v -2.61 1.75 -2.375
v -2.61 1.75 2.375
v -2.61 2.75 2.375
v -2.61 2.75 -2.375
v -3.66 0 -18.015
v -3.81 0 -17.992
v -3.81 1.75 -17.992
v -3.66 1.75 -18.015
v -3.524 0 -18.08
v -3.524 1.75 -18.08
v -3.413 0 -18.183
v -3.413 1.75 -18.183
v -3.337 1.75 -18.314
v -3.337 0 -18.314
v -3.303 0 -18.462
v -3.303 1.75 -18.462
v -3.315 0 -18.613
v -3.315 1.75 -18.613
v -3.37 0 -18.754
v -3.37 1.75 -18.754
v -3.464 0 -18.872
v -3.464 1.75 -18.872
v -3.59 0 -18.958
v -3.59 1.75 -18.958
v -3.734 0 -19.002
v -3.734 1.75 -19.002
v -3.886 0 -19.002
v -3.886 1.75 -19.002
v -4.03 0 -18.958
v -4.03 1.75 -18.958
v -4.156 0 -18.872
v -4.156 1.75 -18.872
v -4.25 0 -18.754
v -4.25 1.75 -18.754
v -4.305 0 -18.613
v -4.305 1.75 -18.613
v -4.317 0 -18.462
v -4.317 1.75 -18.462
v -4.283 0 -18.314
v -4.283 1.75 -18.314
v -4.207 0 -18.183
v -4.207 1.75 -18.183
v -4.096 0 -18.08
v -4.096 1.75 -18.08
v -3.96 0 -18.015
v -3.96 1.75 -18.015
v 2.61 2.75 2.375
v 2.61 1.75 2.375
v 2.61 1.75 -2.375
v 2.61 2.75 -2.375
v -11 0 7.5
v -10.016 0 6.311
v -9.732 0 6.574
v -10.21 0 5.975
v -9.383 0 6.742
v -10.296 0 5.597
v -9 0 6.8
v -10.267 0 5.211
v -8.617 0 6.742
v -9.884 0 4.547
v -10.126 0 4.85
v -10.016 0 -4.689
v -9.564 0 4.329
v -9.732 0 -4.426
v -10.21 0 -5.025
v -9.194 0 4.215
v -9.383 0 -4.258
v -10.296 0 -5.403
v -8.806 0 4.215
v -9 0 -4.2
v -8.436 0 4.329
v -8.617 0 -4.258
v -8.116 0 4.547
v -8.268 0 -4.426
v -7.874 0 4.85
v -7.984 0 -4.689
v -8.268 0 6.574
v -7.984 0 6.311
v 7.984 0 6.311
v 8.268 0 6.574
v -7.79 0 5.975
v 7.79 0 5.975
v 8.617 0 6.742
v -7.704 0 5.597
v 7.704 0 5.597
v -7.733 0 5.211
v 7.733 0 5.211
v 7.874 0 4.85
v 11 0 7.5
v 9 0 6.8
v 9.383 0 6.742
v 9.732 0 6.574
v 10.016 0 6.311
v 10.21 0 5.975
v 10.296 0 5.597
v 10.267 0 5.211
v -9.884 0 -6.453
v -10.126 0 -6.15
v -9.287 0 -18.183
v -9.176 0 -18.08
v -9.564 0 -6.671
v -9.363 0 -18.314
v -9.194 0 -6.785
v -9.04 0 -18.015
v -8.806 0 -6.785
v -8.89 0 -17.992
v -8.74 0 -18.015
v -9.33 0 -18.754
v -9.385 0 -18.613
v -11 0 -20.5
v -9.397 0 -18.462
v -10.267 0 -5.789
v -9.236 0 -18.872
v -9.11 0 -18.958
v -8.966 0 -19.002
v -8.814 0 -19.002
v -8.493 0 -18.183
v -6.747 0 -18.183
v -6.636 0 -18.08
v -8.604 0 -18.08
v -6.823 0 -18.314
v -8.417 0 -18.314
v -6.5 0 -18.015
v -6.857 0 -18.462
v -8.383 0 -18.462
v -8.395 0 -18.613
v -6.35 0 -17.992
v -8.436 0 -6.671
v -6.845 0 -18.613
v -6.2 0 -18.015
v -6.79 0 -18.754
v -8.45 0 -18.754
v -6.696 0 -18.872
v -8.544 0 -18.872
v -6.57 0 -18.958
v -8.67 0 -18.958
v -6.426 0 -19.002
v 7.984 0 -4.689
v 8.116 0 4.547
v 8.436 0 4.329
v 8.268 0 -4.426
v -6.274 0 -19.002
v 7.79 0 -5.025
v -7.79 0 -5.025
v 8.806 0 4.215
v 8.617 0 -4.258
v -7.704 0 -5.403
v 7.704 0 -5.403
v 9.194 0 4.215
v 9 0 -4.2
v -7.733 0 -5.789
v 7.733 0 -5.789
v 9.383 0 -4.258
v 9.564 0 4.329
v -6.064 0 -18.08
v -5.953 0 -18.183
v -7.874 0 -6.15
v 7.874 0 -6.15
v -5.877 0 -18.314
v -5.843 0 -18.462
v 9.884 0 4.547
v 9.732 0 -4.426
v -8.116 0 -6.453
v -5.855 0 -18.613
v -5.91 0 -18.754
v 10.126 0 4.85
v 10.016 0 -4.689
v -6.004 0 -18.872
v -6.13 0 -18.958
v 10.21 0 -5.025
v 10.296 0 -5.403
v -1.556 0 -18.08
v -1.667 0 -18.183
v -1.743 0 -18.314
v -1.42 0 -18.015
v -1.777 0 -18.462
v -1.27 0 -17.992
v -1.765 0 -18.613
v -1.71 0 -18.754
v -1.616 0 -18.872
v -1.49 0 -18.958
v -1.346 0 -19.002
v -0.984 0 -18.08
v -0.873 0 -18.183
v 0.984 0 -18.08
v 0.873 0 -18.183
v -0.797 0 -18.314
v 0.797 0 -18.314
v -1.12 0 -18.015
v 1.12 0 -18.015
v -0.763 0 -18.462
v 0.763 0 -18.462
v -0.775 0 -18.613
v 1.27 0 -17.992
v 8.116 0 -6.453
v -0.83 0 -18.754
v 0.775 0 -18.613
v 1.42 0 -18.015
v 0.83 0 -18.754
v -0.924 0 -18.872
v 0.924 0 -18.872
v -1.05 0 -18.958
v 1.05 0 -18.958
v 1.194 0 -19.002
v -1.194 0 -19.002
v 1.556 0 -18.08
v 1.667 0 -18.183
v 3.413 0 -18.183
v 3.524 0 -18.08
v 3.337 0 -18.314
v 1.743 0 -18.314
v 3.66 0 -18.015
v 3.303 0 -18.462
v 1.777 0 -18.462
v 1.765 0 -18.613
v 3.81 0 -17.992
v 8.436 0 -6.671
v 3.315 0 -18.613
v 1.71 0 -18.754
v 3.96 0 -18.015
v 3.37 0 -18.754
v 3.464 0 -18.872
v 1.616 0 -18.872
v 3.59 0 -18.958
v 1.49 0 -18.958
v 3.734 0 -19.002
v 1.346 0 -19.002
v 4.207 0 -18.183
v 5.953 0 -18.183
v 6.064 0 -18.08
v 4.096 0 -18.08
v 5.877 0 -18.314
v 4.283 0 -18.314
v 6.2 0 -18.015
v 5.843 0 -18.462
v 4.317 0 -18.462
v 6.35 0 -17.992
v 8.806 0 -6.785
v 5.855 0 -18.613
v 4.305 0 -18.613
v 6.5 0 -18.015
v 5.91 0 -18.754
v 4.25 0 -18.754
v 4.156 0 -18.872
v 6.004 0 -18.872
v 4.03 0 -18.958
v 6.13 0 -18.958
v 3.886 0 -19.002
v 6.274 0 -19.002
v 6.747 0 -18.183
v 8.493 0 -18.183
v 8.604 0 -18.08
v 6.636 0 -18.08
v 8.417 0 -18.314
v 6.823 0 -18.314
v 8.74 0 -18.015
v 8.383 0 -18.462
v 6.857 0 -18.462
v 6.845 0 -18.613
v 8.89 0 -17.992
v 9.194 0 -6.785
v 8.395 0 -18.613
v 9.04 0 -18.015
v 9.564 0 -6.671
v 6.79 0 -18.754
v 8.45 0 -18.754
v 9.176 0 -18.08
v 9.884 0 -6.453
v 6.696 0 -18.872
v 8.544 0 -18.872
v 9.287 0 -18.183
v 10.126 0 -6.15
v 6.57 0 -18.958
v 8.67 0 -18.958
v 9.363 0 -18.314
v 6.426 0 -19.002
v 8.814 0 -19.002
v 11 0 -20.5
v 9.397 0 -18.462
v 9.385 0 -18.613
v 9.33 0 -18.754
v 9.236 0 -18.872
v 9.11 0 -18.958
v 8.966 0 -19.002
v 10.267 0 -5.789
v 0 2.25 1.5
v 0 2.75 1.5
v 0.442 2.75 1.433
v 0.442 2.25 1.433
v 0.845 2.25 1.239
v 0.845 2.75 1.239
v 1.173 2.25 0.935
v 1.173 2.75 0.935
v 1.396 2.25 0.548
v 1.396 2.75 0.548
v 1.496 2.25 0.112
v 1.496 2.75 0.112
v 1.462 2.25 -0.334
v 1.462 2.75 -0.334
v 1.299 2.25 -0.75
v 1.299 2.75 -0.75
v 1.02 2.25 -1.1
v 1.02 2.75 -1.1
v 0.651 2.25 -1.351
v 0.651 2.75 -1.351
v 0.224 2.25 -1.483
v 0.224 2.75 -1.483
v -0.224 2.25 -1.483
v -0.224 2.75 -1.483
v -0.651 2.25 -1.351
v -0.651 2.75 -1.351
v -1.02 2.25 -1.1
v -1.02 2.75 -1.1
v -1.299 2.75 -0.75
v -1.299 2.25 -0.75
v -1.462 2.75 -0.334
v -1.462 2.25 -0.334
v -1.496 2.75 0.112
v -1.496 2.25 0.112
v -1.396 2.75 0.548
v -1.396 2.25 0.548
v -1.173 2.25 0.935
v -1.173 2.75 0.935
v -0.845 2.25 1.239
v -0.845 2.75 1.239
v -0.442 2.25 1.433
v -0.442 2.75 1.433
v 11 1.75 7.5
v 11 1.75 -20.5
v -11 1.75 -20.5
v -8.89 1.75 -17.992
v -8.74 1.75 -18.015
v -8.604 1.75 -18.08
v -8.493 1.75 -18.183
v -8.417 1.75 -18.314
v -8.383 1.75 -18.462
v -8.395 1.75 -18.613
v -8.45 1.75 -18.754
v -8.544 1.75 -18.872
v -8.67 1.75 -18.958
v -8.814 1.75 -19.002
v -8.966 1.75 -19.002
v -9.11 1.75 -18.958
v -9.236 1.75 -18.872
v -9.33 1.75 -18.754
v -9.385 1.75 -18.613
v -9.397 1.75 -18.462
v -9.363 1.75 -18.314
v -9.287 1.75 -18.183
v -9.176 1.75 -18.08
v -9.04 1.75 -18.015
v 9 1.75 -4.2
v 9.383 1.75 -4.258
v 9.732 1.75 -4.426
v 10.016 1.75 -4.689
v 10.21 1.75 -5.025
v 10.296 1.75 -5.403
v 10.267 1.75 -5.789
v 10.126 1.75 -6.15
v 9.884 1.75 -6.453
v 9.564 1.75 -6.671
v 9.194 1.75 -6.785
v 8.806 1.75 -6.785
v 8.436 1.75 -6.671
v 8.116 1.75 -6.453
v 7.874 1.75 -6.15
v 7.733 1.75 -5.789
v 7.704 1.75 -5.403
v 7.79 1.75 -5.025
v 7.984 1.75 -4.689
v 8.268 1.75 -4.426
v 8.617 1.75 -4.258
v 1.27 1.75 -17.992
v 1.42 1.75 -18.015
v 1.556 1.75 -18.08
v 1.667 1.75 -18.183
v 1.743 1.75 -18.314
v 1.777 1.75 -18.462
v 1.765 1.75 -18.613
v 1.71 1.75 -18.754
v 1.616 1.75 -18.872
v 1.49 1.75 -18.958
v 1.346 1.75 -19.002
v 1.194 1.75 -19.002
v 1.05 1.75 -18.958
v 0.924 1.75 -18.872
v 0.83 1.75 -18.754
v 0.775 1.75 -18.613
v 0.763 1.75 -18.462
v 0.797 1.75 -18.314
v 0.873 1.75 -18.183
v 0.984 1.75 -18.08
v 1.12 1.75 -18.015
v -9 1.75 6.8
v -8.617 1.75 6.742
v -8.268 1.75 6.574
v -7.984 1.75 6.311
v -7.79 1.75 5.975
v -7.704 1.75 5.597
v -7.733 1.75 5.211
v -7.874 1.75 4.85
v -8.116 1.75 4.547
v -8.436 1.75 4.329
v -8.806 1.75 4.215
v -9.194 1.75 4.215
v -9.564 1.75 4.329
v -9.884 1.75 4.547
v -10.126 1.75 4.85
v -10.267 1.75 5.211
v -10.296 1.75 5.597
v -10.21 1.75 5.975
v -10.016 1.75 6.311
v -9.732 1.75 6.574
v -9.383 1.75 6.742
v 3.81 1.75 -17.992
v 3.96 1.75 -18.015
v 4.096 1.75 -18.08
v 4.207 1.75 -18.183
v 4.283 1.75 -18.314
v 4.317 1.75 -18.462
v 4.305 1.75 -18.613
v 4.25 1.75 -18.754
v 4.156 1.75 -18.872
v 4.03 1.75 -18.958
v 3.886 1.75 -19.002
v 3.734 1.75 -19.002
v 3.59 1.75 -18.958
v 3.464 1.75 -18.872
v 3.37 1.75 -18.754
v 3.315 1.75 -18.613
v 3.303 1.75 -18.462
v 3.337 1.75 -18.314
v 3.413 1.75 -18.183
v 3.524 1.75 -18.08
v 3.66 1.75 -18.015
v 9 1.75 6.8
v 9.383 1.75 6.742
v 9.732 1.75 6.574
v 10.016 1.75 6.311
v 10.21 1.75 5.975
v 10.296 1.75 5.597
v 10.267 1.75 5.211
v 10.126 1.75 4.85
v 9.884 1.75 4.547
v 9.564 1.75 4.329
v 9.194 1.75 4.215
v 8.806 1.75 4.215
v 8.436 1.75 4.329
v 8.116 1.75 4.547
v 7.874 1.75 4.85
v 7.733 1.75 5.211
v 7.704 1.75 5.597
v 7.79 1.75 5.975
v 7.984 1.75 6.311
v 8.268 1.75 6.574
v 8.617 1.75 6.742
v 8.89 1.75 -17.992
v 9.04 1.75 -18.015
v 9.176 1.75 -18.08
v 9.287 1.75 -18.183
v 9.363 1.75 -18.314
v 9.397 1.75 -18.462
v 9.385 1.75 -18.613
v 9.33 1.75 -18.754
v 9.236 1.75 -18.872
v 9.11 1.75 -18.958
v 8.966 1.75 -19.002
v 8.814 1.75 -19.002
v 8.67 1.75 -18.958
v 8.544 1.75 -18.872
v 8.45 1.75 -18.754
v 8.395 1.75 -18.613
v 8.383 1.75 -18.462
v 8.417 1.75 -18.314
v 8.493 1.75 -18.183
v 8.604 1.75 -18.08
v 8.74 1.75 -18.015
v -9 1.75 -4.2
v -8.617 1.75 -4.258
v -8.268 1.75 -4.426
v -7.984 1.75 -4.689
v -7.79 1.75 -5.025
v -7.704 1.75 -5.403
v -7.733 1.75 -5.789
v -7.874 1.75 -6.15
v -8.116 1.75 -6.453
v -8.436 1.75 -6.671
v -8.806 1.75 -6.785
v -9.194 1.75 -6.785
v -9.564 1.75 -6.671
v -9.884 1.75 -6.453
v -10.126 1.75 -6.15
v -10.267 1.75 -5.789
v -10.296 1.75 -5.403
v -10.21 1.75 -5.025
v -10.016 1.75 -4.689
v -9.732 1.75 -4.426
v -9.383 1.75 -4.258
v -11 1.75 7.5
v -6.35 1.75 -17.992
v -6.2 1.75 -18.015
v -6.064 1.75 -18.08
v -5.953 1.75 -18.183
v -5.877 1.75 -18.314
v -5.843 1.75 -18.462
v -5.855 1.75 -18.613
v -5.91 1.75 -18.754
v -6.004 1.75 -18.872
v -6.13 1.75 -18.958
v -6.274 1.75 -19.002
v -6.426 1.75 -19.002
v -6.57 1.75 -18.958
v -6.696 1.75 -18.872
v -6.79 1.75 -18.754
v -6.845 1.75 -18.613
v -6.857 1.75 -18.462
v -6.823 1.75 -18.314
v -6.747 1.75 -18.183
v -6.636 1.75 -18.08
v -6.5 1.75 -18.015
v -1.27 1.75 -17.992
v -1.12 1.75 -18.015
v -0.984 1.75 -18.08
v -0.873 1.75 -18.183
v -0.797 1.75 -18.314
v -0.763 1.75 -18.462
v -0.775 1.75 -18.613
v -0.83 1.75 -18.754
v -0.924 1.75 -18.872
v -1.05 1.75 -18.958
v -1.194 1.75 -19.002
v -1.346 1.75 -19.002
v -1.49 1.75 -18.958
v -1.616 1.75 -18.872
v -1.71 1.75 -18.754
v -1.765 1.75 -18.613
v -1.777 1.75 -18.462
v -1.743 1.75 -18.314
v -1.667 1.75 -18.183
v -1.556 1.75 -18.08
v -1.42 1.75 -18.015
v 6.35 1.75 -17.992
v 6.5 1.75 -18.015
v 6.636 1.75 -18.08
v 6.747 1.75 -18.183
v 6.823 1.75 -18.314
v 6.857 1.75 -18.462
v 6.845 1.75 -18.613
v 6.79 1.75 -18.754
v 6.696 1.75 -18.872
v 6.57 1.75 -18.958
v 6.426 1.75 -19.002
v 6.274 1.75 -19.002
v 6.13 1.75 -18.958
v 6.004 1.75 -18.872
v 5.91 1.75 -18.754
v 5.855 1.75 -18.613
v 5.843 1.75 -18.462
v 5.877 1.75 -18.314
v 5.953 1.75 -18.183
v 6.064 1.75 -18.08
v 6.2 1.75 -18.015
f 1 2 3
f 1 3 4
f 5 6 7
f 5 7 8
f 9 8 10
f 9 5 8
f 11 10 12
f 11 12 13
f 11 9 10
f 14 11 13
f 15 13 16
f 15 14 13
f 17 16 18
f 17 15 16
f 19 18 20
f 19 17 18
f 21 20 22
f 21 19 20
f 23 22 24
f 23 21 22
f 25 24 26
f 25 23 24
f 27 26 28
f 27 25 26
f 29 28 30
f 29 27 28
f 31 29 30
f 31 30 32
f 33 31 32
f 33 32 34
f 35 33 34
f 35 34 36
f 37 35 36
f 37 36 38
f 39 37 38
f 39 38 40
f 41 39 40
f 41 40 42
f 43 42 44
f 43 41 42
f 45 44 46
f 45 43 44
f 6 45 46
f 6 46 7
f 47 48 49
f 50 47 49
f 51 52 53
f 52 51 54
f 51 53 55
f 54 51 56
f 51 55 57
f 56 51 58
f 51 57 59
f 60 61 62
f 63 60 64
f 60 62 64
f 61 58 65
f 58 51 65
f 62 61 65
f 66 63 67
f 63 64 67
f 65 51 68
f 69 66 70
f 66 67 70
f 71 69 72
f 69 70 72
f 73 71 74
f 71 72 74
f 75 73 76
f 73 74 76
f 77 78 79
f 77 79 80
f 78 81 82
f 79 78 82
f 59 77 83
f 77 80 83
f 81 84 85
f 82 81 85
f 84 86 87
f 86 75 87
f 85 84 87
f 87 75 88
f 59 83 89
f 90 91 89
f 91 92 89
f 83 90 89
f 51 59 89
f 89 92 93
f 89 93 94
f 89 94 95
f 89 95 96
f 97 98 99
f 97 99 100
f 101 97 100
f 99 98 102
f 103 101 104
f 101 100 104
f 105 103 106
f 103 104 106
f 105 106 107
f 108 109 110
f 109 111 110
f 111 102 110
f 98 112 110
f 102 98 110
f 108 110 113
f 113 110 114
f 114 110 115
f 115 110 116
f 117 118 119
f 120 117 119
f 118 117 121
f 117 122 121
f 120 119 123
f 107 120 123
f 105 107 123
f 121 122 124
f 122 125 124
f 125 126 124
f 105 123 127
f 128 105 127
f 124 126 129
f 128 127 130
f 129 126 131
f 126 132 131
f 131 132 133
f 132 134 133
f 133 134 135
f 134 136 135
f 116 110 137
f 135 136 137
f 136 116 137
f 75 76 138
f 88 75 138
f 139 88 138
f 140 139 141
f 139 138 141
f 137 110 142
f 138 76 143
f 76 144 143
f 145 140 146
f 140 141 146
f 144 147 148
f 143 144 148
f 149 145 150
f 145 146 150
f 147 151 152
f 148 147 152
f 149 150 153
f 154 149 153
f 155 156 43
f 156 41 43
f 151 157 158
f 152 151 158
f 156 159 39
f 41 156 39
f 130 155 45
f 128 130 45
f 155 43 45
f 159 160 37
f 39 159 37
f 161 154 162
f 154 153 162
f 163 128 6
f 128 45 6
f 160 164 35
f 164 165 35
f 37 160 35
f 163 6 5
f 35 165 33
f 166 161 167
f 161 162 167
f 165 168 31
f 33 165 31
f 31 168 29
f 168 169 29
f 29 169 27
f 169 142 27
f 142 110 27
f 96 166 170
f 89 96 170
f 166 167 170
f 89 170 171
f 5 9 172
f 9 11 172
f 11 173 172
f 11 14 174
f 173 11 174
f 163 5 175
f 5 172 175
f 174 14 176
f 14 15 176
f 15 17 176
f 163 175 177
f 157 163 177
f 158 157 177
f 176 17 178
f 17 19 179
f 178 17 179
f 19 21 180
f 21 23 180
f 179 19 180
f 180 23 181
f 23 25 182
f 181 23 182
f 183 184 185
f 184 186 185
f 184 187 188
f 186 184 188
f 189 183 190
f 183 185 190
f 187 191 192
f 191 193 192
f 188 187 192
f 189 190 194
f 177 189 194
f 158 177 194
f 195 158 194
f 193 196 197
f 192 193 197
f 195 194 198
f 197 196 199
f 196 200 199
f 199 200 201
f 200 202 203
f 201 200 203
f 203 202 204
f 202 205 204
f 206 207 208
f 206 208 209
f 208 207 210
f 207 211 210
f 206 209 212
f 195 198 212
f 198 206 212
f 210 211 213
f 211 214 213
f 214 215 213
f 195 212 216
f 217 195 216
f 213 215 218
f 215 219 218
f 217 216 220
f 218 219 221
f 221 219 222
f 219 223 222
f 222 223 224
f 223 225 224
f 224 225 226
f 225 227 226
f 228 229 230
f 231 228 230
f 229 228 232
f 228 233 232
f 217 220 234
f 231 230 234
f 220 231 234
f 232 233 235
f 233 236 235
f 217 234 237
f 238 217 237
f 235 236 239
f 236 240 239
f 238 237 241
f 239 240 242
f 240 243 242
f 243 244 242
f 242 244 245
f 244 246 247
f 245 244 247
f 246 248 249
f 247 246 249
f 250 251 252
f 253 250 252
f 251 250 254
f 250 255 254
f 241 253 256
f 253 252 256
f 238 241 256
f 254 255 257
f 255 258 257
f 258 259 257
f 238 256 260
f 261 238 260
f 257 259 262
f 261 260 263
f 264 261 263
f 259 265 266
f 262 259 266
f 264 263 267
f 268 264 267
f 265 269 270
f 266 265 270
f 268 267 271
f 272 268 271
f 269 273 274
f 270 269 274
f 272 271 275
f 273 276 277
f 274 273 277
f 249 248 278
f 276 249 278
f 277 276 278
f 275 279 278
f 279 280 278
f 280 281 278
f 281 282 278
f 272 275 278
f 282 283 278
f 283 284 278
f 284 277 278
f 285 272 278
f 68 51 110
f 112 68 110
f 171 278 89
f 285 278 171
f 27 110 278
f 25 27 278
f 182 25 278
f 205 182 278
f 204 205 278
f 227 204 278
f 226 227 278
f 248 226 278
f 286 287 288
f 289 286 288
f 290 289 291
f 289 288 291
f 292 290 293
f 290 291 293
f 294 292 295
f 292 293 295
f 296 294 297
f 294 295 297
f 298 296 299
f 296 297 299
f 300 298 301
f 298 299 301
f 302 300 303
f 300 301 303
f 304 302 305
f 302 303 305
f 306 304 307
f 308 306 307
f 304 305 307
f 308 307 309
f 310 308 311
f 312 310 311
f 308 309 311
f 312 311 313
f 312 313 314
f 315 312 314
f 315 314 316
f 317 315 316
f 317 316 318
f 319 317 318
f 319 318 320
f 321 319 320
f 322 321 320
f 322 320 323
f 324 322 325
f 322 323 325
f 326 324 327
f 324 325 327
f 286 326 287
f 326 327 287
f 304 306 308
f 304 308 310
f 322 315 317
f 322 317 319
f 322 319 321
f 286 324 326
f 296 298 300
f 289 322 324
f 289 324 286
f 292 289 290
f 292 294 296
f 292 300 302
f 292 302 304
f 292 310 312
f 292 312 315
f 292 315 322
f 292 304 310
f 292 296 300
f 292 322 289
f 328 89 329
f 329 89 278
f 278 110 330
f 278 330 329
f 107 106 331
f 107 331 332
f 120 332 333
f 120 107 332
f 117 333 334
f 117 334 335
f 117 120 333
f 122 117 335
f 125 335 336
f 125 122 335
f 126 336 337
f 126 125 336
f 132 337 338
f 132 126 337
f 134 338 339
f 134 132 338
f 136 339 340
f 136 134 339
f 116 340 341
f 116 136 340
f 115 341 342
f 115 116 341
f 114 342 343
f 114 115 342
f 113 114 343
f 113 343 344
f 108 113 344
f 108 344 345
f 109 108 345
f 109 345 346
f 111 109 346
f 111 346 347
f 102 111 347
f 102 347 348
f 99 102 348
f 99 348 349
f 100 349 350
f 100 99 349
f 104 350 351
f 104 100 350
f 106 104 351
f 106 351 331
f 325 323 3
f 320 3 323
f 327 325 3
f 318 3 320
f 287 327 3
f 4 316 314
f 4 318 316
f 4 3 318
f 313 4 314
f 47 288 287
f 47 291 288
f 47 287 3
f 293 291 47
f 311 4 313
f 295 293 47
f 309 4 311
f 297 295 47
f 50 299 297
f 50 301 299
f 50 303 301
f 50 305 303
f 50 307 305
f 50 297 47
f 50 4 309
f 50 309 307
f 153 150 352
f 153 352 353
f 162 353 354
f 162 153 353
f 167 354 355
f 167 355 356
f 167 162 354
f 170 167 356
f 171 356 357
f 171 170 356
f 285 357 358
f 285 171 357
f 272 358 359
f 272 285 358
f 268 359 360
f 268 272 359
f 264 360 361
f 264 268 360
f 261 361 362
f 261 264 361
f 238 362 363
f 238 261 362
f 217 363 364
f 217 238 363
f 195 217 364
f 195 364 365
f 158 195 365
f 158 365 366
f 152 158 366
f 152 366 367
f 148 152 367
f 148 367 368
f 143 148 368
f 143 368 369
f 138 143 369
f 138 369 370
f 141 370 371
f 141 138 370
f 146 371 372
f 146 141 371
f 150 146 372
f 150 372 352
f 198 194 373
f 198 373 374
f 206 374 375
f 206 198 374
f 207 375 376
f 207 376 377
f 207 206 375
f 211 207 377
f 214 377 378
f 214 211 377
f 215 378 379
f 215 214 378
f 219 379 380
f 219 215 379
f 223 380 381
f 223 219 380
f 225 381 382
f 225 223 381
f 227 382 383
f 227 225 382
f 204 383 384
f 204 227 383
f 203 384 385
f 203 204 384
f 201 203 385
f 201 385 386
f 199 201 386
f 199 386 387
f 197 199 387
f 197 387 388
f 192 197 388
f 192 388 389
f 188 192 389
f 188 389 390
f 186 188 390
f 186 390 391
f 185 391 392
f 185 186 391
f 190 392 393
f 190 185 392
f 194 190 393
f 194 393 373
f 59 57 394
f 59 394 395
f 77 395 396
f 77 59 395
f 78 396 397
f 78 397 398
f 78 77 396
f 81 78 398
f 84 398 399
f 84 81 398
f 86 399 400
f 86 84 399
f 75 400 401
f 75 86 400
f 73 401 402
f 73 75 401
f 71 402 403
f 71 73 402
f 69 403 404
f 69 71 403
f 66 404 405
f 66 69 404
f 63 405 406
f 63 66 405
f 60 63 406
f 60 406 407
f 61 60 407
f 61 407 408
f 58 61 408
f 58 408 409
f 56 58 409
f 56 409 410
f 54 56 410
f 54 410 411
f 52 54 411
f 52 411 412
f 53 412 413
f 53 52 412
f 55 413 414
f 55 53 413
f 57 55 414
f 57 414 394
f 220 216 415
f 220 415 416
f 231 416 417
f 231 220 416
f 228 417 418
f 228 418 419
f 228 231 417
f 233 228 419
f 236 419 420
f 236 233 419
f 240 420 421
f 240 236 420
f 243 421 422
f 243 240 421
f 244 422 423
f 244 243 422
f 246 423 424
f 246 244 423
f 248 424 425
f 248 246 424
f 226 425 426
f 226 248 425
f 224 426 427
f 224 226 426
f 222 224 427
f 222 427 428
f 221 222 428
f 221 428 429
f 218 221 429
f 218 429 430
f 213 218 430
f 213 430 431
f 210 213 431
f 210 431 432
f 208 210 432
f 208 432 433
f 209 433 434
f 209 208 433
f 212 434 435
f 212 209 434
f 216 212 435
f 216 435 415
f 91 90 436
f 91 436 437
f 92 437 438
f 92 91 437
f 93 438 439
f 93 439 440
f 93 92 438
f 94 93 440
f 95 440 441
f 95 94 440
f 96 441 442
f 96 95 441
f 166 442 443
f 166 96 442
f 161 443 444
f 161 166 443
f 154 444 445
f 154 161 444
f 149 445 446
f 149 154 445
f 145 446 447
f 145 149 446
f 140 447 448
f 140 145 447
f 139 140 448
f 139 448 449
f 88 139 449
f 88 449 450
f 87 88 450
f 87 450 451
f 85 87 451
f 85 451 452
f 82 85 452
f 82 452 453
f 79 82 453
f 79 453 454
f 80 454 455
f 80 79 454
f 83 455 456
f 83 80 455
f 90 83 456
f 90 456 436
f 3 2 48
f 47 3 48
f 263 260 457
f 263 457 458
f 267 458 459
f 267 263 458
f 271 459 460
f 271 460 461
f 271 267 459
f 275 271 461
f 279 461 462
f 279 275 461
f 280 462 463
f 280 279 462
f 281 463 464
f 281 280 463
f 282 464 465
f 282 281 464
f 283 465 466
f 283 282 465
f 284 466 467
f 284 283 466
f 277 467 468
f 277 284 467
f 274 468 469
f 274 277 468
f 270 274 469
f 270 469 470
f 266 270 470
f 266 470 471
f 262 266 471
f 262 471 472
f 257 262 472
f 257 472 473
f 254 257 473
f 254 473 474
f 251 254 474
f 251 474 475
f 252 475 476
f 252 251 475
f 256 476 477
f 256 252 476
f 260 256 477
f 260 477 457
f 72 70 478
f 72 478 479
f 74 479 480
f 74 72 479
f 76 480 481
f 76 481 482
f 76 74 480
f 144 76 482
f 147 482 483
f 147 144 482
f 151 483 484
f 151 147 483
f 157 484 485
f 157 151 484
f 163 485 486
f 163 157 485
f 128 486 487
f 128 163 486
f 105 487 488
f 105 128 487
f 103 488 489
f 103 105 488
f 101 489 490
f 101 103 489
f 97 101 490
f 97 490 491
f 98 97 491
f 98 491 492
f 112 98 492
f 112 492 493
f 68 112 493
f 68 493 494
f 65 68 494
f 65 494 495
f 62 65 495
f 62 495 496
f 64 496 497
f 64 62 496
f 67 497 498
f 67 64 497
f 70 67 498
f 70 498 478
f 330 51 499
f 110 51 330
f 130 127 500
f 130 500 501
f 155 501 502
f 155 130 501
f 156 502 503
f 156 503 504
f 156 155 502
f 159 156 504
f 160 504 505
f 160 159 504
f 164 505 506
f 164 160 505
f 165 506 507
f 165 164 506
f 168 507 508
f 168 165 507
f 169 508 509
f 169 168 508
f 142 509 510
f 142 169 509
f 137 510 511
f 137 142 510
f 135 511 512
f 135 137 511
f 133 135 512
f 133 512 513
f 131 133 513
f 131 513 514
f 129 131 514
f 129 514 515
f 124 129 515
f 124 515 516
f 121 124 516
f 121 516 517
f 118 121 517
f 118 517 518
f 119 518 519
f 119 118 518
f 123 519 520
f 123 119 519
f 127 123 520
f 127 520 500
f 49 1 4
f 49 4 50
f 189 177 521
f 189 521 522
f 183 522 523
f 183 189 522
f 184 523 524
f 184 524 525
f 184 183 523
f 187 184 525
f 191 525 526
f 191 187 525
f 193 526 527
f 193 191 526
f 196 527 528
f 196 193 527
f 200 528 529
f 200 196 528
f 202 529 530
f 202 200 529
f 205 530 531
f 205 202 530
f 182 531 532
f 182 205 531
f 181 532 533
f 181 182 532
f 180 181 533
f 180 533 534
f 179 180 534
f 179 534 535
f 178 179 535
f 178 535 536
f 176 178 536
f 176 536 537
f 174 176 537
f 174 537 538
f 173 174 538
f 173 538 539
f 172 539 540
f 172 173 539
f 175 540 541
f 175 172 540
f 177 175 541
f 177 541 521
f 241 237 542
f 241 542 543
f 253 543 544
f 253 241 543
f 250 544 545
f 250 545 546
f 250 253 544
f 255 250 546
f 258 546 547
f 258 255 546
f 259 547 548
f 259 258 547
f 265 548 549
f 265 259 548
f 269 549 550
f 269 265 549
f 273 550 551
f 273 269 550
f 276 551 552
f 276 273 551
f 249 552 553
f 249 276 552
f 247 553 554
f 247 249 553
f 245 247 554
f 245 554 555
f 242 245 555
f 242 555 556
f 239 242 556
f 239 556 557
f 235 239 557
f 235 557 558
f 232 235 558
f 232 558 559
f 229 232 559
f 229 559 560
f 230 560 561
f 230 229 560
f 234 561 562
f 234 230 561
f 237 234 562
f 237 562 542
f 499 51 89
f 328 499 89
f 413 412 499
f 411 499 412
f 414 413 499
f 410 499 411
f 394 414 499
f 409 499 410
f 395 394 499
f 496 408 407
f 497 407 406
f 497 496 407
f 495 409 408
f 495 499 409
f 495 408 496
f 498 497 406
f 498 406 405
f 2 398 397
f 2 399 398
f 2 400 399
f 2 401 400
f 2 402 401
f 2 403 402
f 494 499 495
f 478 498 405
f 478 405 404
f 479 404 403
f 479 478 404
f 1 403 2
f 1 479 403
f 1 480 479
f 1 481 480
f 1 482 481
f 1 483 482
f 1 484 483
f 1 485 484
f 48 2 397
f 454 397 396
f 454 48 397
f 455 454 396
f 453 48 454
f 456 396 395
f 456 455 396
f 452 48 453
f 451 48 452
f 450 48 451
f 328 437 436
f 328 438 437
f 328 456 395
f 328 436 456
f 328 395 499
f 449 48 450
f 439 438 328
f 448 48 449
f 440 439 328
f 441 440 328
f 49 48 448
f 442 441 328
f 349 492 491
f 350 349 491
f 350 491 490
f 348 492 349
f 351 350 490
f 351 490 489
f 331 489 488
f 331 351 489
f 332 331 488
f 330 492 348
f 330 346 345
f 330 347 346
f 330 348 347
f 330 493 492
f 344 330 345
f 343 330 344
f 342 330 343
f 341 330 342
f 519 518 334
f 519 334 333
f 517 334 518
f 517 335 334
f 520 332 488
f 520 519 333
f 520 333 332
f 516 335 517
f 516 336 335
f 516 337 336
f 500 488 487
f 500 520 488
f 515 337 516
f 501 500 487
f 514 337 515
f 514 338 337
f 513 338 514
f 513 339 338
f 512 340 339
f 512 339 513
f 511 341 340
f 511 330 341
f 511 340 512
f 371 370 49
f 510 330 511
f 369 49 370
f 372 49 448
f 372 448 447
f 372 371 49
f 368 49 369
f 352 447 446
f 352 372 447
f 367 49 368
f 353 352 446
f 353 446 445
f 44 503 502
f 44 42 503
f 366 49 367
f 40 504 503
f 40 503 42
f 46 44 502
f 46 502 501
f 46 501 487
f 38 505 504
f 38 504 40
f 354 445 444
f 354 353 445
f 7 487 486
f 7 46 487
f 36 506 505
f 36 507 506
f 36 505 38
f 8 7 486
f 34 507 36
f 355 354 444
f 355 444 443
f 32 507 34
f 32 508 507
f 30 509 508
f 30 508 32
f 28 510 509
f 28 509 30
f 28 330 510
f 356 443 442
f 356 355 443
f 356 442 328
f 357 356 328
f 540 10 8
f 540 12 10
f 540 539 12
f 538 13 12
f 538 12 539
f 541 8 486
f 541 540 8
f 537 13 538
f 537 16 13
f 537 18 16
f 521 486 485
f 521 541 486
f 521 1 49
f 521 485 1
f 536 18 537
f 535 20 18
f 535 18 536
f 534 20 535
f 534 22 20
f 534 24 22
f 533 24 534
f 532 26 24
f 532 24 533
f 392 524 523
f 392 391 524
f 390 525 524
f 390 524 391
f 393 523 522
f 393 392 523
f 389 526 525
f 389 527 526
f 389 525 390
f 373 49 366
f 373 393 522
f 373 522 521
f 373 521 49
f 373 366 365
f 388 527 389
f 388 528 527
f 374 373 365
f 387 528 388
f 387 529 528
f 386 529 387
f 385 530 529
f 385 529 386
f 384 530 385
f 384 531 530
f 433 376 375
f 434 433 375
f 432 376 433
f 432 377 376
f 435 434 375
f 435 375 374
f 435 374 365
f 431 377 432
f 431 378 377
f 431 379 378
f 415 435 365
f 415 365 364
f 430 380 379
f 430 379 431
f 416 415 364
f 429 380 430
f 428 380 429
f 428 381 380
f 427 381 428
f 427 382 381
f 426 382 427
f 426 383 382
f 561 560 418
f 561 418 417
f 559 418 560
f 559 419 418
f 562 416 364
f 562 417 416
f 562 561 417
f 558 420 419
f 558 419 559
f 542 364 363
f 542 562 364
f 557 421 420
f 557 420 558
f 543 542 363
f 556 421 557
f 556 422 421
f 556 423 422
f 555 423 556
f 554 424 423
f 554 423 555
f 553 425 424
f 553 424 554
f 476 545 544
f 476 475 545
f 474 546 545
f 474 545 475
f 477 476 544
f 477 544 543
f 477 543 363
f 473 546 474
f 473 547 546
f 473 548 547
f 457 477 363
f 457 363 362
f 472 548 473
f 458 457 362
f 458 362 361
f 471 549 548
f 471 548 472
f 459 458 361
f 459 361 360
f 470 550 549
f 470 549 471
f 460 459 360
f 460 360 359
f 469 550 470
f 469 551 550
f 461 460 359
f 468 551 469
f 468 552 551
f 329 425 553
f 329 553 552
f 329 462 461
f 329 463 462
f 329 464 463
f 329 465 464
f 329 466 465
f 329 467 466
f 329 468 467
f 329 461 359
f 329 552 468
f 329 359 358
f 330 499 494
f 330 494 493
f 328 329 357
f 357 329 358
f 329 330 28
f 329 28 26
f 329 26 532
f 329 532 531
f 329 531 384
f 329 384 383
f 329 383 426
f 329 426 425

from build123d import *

# Parameters (mm, degrees)
SKETCH1_W           = 22
SKETCH1_H           = 28
SKETCH1_R           = 1.3
SKETCH1_R_2         = 0.508
BOSS_EXTRUDE1_DEPTH = 1.75
SKETCH2_W           = 5.22
SKETCH2_H           = 4.75
BOSS_EXTRUDE2_DEPTH = 1
SKETCH3_R           = 1.5
CUT_EXTRUDE1_DEPTH  = 0.5


with BuildPart() as part:
    # Sketch1 → Boss-Extrude1 (new body)
    with BuildSketch(Plane(origin=(0, 0, 0), x_dir=(1, 0, 0), z_dir=(0, 1, 0))):
        with Locations((0, 6.5)):
            Rectangle(SKETCH1_W, SKETCH1_H)
        with Locations(Location((-9, 5.5, 0), (0, 0, 270))):
            Circle(SKETCH1_R, mode=Mode.SUBTRACT)
        with Locations(Location((9, 5.5, 0), (0, 0, 270))):
            Circle(SKETCH1_R, mode=Mode.SUBTRACT)
        with Locations(Location((9, -5.5, 0), (0, 0, 270))):
            Circle(SKETCH1_R, mode=Mode.SUBTRACT)
        with Locations(Location((-9, -5.5, 0), (0, 0, 270))):
            Circle(SKETCH1_R, mode=Mode.SUBTRACT)
        with Locations(Location((-8.89, 18.5, 0), (0, 0, 270))):
            Circle(SKETCH1_R_2, mode=Mode.SUBTRACT)
        with Locations(Location((-6.35, 18.5, 0), (0, 0, 270))):
            Circle(SKETCH1_R_2, mode=Mode.SUBTRACT)
        with Locations(Location((-3.81, 18.5, 0), (0, 0, 270))):
            Circle(SKETCH1_R_2, mode=Mode.SUBTRACT)
        with Locations(Location((-1.27, 18.5, 0), (0, 0, 270))):
            Circle(SKETCH1_R_2, mode=Mode.SUBTRACT)
        with Locations(Location((1.27, 18.5, 0), (0, 0, 270))):
            Circle(SKETCH1_R_2, mode=Mode.SUBTRACT)
        with Locations(Location((3.81, 18.5, 0), (0, 0, 270))):
            Circle(SKETCH1_R_2, mode=Mode.SUBTRACT)
        with Locations(Location((6.35, 18.5, 0), (0, 0, 270))):
            Circle(SKETCH1_R_2, mode=Mode.SUBTRACT)
        with Locations(Location((8.89, 18.5, 0), (0, 0, 270))):
            Circle(SKETCH1_R_2, mode=Mode.SUBTRACT)
    extrude(amount=BOSS_EXTRUDE1_DEPTH)

    # Sketch2 → Boss-Extrude2 (add)
    with BuildSketch(Plane(origin=(0, 1.75, 0), x_dir=(1, 0, 0), z_dir=(0, 1, 0))):
        Rectangle(SKETCH2_W, SKETCH2_H)
    extrude(amount=BOSS_EXTRUDE2_DEPTH)

    # Sketch3 → Cut-Extrude1 (cut)
    with BuildSketch(Plane(origin=(0, 2.75, 0), x_dir=(1, 0, 0), z_dir=(0, 1, 0))):
        with Locations(Location((0, 0, 0), (0, 0, 270))):
            Circle(SKETCH3_R)
    extrude(amount=-CUT_EXTRUDE1_DEPTH, mode=Mode.SUBTRACT)


solid = part.part
